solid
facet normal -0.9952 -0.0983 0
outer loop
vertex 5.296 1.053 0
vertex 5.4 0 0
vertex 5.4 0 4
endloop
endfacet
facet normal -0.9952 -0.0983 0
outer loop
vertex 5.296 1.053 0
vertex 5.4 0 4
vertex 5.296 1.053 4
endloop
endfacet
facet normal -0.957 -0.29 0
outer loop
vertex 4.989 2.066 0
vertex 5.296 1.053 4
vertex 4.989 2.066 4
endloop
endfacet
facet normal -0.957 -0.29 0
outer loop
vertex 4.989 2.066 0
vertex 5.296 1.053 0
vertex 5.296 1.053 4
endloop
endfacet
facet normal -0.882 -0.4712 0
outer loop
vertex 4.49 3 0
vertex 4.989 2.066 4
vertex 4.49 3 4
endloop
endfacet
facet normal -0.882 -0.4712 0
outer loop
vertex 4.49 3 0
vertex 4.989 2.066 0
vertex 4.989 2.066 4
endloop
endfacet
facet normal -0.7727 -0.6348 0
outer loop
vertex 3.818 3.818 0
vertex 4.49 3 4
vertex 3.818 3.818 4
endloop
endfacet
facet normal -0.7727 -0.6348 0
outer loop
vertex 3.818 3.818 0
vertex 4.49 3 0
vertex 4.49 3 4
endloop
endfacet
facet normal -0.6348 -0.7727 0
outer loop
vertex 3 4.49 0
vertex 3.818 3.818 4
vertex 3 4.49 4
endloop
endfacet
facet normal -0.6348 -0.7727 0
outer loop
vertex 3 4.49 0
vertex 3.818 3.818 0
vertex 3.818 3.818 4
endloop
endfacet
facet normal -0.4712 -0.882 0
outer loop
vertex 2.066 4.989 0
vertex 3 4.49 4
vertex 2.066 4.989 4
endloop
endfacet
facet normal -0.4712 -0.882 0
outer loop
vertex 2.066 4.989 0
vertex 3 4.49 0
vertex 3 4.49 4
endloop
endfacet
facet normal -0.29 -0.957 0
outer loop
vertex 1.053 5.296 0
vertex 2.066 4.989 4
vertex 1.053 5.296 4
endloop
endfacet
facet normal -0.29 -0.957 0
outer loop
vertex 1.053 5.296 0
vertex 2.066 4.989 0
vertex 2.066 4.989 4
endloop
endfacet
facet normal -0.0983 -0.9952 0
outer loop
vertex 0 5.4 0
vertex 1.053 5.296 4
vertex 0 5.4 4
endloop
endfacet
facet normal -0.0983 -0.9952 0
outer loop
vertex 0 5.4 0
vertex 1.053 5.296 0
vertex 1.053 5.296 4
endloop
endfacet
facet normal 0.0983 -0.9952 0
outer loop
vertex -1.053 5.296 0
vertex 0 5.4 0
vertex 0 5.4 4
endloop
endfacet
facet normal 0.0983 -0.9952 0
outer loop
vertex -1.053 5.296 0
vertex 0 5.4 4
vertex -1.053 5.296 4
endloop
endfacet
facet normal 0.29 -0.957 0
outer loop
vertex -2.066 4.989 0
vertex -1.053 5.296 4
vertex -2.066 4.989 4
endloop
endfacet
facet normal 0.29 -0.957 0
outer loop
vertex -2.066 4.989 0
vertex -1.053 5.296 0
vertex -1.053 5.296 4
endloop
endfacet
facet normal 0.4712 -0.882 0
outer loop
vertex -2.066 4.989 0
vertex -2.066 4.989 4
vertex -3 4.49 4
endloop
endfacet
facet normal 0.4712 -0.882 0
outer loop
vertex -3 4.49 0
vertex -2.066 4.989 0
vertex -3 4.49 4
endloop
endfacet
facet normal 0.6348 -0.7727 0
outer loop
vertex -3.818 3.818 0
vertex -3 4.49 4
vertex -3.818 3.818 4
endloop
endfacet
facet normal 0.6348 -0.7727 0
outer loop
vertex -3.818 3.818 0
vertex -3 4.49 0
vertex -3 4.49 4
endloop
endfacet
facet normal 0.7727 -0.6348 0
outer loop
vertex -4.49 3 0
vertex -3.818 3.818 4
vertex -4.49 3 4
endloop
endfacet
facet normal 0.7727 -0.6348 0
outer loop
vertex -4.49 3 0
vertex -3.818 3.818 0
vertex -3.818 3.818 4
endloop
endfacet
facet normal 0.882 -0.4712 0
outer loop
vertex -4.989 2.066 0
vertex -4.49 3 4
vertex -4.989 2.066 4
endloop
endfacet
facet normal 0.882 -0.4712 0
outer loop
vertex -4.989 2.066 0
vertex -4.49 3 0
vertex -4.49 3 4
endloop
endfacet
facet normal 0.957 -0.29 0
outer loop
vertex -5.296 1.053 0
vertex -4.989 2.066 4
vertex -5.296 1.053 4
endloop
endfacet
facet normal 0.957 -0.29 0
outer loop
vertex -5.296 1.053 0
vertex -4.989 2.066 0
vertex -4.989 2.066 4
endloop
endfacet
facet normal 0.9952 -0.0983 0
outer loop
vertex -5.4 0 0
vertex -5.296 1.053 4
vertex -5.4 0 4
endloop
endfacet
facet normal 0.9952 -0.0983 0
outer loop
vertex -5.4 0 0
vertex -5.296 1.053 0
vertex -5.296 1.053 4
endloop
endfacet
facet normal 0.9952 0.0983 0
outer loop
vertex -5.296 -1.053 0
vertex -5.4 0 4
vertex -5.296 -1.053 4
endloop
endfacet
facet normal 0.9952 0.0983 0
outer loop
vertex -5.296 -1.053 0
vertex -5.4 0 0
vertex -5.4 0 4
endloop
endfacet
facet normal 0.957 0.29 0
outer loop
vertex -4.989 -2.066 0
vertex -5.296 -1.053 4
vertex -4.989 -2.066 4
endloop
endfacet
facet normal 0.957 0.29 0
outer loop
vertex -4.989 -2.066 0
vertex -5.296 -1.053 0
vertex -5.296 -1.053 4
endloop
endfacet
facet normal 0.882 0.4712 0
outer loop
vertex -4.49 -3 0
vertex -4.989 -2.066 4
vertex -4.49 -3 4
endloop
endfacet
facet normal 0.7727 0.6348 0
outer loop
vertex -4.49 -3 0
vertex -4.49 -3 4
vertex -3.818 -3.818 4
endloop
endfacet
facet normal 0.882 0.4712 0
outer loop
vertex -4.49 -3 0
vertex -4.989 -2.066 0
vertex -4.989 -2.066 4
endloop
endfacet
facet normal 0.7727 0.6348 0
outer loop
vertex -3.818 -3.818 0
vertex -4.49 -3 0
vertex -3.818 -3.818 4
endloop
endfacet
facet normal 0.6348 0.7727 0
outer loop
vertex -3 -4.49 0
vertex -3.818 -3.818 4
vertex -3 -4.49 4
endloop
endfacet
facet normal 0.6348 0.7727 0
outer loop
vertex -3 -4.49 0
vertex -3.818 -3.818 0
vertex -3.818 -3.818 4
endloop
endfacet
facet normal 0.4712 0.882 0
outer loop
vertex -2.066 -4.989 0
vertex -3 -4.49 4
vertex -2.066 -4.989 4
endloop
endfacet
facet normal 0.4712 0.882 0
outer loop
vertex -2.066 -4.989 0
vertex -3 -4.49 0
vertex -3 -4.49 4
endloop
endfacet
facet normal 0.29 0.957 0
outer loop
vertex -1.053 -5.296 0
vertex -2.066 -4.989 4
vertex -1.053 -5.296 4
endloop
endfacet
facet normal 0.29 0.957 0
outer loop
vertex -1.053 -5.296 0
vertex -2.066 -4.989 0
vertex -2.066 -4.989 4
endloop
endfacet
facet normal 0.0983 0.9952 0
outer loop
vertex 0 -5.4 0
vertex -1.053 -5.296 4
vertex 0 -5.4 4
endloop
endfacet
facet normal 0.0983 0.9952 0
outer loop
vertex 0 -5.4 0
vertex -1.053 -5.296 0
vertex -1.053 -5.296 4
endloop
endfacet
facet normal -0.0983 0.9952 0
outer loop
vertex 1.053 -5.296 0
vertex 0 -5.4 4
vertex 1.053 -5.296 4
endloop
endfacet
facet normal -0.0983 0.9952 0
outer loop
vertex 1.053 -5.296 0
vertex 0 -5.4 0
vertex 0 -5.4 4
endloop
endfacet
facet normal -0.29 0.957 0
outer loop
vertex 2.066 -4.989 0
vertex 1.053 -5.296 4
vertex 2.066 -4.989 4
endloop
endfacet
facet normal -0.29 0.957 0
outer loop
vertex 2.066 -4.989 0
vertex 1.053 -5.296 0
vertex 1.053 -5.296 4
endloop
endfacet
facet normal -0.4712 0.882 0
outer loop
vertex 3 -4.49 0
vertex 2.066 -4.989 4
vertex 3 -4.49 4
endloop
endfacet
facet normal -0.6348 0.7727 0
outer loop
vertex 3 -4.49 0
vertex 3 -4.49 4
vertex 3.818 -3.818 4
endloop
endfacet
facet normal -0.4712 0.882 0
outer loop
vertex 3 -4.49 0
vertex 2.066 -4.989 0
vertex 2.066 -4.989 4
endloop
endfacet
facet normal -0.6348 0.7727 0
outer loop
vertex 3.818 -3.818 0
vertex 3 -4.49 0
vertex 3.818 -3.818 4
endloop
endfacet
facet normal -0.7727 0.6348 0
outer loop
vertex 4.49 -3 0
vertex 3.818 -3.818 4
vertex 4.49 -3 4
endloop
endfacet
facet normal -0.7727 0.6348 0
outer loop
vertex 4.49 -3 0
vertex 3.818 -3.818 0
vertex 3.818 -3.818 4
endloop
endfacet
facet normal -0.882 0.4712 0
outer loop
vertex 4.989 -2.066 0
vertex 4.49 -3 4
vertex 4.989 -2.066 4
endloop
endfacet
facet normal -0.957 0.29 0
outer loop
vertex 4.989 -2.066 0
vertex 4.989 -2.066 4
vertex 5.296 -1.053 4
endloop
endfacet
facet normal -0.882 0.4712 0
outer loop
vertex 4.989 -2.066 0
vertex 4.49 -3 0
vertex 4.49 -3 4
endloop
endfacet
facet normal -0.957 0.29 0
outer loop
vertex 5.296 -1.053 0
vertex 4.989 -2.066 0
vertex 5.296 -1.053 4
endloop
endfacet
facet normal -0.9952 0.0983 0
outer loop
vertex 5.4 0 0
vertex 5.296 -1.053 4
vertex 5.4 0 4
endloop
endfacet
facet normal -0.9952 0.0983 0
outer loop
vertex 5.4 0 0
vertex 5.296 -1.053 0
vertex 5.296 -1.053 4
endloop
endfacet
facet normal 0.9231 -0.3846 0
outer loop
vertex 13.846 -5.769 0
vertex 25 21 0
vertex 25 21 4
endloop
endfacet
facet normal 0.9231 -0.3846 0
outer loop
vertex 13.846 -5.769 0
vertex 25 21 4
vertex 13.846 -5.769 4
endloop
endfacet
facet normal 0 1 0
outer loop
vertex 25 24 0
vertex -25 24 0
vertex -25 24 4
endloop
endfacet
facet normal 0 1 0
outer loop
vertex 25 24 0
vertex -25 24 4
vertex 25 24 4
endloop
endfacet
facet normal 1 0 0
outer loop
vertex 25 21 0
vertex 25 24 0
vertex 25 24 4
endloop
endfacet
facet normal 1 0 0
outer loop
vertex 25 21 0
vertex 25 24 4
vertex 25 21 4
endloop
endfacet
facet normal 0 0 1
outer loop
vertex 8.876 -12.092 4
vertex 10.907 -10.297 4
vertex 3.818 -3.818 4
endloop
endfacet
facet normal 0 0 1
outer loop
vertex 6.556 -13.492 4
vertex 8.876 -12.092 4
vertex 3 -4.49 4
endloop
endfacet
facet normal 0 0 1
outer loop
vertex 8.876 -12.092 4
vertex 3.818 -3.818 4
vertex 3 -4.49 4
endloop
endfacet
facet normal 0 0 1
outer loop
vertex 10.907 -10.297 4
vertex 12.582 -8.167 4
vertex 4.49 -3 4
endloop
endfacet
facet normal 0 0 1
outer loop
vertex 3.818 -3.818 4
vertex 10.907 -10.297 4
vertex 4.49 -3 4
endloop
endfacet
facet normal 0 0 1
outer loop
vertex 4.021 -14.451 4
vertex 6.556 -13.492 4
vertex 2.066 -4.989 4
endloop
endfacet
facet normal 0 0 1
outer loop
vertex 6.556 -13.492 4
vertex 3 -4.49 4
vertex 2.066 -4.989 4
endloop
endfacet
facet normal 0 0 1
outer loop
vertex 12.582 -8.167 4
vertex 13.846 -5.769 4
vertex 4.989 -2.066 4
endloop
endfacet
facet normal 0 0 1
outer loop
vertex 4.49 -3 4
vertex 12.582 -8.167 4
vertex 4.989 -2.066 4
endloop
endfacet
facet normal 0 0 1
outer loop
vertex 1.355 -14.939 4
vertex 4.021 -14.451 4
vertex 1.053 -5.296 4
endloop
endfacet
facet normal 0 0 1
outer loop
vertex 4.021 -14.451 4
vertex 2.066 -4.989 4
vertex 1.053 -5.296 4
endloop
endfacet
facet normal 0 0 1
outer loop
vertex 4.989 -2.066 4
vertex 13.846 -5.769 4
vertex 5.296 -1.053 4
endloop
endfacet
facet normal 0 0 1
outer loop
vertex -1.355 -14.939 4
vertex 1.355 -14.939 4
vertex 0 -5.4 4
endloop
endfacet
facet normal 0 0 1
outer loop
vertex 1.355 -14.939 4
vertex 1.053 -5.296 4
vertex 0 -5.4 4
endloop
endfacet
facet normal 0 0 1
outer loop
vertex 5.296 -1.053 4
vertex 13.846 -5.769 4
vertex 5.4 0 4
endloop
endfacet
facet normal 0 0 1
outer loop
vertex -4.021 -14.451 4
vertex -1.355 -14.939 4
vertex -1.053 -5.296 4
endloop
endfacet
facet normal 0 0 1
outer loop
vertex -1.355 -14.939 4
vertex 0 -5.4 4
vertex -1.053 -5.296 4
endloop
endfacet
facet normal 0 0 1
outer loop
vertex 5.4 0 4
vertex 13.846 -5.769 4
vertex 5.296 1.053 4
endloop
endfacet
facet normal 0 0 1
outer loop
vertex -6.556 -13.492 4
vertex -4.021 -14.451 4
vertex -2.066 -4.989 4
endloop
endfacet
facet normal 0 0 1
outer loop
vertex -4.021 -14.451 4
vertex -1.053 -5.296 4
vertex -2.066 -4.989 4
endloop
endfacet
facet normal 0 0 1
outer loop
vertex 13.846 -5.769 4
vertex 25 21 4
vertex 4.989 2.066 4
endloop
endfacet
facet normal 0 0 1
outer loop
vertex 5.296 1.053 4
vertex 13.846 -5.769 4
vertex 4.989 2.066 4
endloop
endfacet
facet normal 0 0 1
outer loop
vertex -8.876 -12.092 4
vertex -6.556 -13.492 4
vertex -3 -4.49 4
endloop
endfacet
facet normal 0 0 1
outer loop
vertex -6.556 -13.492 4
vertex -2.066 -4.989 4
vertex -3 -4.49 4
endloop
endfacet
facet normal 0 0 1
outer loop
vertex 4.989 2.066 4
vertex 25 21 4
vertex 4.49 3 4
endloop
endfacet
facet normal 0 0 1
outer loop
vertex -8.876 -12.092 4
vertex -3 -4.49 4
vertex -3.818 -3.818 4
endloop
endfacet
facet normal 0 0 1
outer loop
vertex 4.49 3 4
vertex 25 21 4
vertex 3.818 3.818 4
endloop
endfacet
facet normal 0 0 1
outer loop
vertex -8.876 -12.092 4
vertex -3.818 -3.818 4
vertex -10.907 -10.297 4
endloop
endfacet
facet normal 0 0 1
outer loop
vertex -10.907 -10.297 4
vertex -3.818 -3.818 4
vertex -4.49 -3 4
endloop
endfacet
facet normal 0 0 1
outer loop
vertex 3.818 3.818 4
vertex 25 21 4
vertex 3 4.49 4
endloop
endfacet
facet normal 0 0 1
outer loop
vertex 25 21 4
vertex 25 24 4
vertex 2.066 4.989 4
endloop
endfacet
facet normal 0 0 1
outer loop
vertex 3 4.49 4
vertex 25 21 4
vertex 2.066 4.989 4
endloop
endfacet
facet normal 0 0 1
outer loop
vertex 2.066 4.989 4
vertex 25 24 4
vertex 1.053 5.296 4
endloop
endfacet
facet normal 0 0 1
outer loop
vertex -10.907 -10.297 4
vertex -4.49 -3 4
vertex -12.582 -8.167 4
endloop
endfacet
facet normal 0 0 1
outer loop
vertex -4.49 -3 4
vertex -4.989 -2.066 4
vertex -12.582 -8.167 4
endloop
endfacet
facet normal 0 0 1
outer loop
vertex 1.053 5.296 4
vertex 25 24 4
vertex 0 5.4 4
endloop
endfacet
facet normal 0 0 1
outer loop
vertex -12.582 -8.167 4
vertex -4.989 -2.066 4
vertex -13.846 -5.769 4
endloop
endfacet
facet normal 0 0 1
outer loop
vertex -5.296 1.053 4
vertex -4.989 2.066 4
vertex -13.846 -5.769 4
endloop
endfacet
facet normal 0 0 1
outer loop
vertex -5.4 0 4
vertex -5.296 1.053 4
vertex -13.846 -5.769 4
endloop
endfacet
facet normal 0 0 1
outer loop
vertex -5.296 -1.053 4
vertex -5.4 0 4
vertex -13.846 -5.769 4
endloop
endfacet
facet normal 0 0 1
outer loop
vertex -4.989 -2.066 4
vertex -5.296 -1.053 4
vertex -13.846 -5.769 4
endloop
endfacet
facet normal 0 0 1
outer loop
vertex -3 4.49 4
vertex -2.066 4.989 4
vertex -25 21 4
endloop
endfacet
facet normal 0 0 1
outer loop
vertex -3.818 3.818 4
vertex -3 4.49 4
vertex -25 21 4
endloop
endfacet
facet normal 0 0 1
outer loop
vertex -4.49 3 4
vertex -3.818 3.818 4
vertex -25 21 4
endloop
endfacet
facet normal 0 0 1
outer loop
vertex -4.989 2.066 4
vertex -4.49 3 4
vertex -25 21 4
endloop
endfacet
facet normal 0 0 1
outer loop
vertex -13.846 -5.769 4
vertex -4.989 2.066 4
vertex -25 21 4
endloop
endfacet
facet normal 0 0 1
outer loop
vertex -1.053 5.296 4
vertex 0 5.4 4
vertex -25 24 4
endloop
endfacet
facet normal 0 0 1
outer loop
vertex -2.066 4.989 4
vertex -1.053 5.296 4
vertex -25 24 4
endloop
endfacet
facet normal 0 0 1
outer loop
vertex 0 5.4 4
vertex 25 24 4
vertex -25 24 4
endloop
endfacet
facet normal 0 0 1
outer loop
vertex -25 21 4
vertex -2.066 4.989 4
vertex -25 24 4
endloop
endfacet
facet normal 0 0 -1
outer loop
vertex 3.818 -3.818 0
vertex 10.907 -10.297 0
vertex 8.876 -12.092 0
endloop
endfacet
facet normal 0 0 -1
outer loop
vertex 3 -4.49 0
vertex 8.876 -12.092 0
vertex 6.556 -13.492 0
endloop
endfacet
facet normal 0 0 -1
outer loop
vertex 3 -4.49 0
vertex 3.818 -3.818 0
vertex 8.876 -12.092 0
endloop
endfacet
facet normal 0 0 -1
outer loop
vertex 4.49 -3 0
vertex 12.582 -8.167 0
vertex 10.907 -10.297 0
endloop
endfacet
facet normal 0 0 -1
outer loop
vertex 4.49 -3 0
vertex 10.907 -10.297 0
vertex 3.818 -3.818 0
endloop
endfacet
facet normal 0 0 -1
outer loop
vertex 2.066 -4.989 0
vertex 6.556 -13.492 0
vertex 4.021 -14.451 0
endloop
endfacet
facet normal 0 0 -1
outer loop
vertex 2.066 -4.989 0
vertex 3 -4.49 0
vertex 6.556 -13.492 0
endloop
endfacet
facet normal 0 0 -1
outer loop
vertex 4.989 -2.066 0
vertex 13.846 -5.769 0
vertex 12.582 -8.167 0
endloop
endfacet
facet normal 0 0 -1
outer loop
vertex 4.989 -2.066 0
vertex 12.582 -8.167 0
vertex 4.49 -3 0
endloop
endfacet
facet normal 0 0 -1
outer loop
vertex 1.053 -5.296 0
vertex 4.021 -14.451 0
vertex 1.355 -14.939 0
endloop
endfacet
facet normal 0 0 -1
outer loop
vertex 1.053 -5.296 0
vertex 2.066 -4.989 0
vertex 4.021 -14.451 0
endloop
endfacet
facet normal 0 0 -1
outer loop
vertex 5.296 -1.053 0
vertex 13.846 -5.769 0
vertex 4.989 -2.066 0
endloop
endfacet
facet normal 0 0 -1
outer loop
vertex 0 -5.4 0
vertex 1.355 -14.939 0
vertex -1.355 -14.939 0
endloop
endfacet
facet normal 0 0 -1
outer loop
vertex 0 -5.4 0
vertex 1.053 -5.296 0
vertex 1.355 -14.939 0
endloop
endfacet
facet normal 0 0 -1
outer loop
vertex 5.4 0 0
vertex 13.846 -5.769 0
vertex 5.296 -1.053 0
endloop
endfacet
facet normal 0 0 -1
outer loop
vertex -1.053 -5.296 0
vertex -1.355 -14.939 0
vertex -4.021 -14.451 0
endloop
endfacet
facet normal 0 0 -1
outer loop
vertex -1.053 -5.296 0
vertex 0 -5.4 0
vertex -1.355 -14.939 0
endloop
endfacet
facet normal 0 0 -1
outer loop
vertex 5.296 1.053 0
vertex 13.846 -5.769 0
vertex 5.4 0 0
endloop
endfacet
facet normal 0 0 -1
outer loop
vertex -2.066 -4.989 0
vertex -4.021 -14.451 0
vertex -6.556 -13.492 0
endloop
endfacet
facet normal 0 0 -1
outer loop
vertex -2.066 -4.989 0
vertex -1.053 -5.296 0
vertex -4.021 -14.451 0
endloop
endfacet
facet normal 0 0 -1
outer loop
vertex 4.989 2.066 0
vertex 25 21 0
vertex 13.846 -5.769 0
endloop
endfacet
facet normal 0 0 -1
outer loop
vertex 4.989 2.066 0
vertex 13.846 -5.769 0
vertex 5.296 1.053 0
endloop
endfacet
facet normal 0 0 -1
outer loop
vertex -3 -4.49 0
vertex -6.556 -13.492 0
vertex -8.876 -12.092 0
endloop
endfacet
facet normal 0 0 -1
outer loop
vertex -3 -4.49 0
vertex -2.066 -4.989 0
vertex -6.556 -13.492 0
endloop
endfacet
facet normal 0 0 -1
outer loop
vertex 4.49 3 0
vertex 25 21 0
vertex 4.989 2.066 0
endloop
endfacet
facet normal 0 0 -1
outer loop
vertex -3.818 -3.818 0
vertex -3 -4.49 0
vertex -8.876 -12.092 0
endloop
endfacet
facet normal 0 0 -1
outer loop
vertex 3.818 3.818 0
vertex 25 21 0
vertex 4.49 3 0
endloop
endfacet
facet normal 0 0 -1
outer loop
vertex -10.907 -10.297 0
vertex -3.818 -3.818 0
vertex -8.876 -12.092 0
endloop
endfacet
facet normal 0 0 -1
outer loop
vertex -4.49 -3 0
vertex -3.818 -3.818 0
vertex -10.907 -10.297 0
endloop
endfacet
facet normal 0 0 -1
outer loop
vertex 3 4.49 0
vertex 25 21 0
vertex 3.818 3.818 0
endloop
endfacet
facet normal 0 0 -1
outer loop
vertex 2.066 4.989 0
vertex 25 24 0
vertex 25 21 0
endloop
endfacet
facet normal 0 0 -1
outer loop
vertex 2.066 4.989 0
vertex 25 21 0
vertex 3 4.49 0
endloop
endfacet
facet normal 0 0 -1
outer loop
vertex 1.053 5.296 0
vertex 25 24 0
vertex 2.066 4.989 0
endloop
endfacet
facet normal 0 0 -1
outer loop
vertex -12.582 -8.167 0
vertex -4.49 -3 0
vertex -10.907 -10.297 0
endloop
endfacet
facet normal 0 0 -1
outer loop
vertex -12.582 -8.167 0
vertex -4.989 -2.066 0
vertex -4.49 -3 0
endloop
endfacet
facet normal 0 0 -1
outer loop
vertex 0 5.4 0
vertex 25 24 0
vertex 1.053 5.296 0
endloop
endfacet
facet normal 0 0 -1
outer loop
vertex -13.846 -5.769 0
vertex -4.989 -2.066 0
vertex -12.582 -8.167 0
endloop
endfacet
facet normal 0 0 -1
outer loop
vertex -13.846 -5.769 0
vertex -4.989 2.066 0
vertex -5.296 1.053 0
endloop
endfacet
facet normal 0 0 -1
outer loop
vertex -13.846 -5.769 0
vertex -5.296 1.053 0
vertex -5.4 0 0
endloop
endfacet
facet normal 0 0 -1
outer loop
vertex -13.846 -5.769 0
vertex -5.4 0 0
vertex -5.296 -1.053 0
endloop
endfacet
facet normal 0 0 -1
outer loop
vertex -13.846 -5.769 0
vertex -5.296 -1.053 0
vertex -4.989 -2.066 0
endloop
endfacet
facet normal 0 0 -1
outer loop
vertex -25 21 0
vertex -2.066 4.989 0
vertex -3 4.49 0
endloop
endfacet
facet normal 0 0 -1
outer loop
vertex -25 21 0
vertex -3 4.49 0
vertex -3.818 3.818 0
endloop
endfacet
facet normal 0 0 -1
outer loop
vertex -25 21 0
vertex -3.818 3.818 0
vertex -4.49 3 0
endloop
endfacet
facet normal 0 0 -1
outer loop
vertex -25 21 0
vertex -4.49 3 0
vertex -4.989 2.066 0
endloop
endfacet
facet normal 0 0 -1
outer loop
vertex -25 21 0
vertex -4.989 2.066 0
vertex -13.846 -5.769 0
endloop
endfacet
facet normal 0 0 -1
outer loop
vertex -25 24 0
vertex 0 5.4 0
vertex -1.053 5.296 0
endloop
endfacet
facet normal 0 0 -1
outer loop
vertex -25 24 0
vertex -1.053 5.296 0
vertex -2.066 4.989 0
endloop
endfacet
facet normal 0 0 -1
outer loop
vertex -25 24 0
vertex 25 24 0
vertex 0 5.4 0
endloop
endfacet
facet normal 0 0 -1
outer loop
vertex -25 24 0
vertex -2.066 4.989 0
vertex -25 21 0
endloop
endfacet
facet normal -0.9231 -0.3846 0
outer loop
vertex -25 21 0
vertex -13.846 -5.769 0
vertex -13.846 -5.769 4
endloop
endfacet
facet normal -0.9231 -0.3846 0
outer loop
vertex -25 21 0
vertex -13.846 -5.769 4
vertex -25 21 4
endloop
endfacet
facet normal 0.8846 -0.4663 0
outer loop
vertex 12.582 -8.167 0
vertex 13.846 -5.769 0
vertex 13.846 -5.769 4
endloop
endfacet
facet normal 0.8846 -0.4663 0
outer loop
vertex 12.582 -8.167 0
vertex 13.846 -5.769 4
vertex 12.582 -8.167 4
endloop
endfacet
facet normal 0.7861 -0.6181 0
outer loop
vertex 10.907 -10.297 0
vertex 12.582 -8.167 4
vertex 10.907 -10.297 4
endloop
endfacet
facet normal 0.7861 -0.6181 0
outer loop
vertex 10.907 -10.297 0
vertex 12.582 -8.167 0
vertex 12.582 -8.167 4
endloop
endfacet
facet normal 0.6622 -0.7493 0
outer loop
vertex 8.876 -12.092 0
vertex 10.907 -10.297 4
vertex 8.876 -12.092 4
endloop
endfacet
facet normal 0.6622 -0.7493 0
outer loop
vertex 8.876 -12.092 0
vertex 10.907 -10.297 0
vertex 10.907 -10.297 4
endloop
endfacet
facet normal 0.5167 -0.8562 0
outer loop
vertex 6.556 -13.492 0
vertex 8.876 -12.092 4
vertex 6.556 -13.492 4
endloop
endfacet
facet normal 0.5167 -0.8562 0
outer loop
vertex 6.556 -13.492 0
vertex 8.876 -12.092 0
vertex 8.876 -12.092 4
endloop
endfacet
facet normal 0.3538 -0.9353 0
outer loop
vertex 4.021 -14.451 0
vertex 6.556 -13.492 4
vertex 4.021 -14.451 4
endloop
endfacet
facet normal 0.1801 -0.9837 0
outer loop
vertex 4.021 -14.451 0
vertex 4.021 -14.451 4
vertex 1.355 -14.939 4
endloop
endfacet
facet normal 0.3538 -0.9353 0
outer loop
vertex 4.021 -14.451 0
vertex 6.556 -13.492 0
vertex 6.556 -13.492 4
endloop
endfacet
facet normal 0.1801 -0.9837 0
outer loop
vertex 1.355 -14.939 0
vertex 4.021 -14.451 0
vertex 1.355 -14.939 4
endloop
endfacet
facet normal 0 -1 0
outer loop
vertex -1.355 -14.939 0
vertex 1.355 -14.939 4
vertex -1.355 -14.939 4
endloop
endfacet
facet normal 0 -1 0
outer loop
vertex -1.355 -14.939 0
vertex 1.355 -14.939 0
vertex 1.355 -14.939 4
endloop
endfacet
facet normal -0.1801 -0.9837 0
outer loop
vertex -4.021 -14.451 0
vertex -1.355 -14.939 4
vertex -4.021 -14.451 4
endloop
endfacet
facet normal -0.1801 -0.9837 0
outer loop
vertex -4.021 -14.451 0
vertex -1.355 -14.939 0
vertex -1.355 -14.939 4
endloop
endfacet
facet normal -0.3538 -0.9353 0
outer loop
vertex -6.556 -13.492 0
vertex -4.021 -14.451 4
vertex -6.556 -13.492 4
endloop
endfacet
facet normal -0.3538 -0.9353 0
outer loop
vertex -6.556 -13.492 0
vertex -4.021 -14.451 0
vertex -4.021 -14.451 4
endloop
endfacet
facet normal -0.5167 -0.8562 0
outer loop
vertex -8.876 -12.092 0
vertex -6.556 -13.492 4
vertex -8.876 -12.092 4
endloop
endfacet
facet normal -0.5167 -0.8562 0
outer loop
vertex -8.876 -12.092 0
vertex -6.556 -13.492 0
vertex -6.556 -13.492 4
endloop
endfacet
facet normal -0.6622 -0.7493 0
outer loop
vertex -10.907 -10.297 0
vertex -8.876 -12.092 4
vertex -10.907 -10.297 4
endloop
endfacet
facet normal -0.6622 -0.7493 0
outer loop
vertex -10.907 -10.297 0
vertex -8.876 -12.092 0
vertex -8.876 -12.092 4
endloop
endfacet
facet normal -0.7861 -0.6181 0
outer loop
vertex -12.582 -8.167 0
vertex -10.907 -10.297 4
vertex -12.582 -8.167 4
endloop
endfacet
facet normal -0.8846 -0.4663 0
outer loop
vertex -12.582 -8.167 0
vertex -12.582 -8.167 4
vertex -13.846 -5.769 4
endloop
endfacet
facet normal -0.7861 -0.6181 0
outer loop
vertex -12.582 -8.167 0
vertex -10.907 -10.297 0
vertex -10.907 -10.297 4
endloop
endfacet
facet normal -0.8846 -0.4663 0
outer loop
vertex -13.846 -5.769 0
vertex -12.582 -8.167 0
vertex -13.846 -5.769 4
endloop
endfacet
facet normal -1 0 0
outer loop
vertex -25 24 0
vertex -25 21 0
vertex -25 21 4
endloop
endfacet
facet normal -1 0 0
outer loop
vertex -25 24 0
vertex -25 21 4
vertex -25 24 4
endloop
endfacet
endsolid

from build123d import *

# Parameters (mm, degrees)
SKETCH_1_R      = 5.4
EXTRUDE_1_DEPTH = 4


with BuildPart() as part:
    # Эскиз1 → Бобышка-Вытянуть1 (new body)
    with BuildSketch(Plane.XY):
        with BuildLine():
            Line((-25, 24), (25, 24))
            Line((25, 24), (25, 21))
            Line((25, 21), (13.846153846, -5.769230769))
            ThreePointArc((13.846153846, -5.769230769), (0, -15), (-13.846153846, -5.769230769))
            Line((-13.846153846, -5.769230769), (-25, 21))
            Line((-25, 21), (-25, 24))
        make_face()
        Circle(SKETCH_1_R, mode=Mode.SUBTRACT)
    extrude(amount=EXTRUDE_1_DEPTH)


solid = part.part
